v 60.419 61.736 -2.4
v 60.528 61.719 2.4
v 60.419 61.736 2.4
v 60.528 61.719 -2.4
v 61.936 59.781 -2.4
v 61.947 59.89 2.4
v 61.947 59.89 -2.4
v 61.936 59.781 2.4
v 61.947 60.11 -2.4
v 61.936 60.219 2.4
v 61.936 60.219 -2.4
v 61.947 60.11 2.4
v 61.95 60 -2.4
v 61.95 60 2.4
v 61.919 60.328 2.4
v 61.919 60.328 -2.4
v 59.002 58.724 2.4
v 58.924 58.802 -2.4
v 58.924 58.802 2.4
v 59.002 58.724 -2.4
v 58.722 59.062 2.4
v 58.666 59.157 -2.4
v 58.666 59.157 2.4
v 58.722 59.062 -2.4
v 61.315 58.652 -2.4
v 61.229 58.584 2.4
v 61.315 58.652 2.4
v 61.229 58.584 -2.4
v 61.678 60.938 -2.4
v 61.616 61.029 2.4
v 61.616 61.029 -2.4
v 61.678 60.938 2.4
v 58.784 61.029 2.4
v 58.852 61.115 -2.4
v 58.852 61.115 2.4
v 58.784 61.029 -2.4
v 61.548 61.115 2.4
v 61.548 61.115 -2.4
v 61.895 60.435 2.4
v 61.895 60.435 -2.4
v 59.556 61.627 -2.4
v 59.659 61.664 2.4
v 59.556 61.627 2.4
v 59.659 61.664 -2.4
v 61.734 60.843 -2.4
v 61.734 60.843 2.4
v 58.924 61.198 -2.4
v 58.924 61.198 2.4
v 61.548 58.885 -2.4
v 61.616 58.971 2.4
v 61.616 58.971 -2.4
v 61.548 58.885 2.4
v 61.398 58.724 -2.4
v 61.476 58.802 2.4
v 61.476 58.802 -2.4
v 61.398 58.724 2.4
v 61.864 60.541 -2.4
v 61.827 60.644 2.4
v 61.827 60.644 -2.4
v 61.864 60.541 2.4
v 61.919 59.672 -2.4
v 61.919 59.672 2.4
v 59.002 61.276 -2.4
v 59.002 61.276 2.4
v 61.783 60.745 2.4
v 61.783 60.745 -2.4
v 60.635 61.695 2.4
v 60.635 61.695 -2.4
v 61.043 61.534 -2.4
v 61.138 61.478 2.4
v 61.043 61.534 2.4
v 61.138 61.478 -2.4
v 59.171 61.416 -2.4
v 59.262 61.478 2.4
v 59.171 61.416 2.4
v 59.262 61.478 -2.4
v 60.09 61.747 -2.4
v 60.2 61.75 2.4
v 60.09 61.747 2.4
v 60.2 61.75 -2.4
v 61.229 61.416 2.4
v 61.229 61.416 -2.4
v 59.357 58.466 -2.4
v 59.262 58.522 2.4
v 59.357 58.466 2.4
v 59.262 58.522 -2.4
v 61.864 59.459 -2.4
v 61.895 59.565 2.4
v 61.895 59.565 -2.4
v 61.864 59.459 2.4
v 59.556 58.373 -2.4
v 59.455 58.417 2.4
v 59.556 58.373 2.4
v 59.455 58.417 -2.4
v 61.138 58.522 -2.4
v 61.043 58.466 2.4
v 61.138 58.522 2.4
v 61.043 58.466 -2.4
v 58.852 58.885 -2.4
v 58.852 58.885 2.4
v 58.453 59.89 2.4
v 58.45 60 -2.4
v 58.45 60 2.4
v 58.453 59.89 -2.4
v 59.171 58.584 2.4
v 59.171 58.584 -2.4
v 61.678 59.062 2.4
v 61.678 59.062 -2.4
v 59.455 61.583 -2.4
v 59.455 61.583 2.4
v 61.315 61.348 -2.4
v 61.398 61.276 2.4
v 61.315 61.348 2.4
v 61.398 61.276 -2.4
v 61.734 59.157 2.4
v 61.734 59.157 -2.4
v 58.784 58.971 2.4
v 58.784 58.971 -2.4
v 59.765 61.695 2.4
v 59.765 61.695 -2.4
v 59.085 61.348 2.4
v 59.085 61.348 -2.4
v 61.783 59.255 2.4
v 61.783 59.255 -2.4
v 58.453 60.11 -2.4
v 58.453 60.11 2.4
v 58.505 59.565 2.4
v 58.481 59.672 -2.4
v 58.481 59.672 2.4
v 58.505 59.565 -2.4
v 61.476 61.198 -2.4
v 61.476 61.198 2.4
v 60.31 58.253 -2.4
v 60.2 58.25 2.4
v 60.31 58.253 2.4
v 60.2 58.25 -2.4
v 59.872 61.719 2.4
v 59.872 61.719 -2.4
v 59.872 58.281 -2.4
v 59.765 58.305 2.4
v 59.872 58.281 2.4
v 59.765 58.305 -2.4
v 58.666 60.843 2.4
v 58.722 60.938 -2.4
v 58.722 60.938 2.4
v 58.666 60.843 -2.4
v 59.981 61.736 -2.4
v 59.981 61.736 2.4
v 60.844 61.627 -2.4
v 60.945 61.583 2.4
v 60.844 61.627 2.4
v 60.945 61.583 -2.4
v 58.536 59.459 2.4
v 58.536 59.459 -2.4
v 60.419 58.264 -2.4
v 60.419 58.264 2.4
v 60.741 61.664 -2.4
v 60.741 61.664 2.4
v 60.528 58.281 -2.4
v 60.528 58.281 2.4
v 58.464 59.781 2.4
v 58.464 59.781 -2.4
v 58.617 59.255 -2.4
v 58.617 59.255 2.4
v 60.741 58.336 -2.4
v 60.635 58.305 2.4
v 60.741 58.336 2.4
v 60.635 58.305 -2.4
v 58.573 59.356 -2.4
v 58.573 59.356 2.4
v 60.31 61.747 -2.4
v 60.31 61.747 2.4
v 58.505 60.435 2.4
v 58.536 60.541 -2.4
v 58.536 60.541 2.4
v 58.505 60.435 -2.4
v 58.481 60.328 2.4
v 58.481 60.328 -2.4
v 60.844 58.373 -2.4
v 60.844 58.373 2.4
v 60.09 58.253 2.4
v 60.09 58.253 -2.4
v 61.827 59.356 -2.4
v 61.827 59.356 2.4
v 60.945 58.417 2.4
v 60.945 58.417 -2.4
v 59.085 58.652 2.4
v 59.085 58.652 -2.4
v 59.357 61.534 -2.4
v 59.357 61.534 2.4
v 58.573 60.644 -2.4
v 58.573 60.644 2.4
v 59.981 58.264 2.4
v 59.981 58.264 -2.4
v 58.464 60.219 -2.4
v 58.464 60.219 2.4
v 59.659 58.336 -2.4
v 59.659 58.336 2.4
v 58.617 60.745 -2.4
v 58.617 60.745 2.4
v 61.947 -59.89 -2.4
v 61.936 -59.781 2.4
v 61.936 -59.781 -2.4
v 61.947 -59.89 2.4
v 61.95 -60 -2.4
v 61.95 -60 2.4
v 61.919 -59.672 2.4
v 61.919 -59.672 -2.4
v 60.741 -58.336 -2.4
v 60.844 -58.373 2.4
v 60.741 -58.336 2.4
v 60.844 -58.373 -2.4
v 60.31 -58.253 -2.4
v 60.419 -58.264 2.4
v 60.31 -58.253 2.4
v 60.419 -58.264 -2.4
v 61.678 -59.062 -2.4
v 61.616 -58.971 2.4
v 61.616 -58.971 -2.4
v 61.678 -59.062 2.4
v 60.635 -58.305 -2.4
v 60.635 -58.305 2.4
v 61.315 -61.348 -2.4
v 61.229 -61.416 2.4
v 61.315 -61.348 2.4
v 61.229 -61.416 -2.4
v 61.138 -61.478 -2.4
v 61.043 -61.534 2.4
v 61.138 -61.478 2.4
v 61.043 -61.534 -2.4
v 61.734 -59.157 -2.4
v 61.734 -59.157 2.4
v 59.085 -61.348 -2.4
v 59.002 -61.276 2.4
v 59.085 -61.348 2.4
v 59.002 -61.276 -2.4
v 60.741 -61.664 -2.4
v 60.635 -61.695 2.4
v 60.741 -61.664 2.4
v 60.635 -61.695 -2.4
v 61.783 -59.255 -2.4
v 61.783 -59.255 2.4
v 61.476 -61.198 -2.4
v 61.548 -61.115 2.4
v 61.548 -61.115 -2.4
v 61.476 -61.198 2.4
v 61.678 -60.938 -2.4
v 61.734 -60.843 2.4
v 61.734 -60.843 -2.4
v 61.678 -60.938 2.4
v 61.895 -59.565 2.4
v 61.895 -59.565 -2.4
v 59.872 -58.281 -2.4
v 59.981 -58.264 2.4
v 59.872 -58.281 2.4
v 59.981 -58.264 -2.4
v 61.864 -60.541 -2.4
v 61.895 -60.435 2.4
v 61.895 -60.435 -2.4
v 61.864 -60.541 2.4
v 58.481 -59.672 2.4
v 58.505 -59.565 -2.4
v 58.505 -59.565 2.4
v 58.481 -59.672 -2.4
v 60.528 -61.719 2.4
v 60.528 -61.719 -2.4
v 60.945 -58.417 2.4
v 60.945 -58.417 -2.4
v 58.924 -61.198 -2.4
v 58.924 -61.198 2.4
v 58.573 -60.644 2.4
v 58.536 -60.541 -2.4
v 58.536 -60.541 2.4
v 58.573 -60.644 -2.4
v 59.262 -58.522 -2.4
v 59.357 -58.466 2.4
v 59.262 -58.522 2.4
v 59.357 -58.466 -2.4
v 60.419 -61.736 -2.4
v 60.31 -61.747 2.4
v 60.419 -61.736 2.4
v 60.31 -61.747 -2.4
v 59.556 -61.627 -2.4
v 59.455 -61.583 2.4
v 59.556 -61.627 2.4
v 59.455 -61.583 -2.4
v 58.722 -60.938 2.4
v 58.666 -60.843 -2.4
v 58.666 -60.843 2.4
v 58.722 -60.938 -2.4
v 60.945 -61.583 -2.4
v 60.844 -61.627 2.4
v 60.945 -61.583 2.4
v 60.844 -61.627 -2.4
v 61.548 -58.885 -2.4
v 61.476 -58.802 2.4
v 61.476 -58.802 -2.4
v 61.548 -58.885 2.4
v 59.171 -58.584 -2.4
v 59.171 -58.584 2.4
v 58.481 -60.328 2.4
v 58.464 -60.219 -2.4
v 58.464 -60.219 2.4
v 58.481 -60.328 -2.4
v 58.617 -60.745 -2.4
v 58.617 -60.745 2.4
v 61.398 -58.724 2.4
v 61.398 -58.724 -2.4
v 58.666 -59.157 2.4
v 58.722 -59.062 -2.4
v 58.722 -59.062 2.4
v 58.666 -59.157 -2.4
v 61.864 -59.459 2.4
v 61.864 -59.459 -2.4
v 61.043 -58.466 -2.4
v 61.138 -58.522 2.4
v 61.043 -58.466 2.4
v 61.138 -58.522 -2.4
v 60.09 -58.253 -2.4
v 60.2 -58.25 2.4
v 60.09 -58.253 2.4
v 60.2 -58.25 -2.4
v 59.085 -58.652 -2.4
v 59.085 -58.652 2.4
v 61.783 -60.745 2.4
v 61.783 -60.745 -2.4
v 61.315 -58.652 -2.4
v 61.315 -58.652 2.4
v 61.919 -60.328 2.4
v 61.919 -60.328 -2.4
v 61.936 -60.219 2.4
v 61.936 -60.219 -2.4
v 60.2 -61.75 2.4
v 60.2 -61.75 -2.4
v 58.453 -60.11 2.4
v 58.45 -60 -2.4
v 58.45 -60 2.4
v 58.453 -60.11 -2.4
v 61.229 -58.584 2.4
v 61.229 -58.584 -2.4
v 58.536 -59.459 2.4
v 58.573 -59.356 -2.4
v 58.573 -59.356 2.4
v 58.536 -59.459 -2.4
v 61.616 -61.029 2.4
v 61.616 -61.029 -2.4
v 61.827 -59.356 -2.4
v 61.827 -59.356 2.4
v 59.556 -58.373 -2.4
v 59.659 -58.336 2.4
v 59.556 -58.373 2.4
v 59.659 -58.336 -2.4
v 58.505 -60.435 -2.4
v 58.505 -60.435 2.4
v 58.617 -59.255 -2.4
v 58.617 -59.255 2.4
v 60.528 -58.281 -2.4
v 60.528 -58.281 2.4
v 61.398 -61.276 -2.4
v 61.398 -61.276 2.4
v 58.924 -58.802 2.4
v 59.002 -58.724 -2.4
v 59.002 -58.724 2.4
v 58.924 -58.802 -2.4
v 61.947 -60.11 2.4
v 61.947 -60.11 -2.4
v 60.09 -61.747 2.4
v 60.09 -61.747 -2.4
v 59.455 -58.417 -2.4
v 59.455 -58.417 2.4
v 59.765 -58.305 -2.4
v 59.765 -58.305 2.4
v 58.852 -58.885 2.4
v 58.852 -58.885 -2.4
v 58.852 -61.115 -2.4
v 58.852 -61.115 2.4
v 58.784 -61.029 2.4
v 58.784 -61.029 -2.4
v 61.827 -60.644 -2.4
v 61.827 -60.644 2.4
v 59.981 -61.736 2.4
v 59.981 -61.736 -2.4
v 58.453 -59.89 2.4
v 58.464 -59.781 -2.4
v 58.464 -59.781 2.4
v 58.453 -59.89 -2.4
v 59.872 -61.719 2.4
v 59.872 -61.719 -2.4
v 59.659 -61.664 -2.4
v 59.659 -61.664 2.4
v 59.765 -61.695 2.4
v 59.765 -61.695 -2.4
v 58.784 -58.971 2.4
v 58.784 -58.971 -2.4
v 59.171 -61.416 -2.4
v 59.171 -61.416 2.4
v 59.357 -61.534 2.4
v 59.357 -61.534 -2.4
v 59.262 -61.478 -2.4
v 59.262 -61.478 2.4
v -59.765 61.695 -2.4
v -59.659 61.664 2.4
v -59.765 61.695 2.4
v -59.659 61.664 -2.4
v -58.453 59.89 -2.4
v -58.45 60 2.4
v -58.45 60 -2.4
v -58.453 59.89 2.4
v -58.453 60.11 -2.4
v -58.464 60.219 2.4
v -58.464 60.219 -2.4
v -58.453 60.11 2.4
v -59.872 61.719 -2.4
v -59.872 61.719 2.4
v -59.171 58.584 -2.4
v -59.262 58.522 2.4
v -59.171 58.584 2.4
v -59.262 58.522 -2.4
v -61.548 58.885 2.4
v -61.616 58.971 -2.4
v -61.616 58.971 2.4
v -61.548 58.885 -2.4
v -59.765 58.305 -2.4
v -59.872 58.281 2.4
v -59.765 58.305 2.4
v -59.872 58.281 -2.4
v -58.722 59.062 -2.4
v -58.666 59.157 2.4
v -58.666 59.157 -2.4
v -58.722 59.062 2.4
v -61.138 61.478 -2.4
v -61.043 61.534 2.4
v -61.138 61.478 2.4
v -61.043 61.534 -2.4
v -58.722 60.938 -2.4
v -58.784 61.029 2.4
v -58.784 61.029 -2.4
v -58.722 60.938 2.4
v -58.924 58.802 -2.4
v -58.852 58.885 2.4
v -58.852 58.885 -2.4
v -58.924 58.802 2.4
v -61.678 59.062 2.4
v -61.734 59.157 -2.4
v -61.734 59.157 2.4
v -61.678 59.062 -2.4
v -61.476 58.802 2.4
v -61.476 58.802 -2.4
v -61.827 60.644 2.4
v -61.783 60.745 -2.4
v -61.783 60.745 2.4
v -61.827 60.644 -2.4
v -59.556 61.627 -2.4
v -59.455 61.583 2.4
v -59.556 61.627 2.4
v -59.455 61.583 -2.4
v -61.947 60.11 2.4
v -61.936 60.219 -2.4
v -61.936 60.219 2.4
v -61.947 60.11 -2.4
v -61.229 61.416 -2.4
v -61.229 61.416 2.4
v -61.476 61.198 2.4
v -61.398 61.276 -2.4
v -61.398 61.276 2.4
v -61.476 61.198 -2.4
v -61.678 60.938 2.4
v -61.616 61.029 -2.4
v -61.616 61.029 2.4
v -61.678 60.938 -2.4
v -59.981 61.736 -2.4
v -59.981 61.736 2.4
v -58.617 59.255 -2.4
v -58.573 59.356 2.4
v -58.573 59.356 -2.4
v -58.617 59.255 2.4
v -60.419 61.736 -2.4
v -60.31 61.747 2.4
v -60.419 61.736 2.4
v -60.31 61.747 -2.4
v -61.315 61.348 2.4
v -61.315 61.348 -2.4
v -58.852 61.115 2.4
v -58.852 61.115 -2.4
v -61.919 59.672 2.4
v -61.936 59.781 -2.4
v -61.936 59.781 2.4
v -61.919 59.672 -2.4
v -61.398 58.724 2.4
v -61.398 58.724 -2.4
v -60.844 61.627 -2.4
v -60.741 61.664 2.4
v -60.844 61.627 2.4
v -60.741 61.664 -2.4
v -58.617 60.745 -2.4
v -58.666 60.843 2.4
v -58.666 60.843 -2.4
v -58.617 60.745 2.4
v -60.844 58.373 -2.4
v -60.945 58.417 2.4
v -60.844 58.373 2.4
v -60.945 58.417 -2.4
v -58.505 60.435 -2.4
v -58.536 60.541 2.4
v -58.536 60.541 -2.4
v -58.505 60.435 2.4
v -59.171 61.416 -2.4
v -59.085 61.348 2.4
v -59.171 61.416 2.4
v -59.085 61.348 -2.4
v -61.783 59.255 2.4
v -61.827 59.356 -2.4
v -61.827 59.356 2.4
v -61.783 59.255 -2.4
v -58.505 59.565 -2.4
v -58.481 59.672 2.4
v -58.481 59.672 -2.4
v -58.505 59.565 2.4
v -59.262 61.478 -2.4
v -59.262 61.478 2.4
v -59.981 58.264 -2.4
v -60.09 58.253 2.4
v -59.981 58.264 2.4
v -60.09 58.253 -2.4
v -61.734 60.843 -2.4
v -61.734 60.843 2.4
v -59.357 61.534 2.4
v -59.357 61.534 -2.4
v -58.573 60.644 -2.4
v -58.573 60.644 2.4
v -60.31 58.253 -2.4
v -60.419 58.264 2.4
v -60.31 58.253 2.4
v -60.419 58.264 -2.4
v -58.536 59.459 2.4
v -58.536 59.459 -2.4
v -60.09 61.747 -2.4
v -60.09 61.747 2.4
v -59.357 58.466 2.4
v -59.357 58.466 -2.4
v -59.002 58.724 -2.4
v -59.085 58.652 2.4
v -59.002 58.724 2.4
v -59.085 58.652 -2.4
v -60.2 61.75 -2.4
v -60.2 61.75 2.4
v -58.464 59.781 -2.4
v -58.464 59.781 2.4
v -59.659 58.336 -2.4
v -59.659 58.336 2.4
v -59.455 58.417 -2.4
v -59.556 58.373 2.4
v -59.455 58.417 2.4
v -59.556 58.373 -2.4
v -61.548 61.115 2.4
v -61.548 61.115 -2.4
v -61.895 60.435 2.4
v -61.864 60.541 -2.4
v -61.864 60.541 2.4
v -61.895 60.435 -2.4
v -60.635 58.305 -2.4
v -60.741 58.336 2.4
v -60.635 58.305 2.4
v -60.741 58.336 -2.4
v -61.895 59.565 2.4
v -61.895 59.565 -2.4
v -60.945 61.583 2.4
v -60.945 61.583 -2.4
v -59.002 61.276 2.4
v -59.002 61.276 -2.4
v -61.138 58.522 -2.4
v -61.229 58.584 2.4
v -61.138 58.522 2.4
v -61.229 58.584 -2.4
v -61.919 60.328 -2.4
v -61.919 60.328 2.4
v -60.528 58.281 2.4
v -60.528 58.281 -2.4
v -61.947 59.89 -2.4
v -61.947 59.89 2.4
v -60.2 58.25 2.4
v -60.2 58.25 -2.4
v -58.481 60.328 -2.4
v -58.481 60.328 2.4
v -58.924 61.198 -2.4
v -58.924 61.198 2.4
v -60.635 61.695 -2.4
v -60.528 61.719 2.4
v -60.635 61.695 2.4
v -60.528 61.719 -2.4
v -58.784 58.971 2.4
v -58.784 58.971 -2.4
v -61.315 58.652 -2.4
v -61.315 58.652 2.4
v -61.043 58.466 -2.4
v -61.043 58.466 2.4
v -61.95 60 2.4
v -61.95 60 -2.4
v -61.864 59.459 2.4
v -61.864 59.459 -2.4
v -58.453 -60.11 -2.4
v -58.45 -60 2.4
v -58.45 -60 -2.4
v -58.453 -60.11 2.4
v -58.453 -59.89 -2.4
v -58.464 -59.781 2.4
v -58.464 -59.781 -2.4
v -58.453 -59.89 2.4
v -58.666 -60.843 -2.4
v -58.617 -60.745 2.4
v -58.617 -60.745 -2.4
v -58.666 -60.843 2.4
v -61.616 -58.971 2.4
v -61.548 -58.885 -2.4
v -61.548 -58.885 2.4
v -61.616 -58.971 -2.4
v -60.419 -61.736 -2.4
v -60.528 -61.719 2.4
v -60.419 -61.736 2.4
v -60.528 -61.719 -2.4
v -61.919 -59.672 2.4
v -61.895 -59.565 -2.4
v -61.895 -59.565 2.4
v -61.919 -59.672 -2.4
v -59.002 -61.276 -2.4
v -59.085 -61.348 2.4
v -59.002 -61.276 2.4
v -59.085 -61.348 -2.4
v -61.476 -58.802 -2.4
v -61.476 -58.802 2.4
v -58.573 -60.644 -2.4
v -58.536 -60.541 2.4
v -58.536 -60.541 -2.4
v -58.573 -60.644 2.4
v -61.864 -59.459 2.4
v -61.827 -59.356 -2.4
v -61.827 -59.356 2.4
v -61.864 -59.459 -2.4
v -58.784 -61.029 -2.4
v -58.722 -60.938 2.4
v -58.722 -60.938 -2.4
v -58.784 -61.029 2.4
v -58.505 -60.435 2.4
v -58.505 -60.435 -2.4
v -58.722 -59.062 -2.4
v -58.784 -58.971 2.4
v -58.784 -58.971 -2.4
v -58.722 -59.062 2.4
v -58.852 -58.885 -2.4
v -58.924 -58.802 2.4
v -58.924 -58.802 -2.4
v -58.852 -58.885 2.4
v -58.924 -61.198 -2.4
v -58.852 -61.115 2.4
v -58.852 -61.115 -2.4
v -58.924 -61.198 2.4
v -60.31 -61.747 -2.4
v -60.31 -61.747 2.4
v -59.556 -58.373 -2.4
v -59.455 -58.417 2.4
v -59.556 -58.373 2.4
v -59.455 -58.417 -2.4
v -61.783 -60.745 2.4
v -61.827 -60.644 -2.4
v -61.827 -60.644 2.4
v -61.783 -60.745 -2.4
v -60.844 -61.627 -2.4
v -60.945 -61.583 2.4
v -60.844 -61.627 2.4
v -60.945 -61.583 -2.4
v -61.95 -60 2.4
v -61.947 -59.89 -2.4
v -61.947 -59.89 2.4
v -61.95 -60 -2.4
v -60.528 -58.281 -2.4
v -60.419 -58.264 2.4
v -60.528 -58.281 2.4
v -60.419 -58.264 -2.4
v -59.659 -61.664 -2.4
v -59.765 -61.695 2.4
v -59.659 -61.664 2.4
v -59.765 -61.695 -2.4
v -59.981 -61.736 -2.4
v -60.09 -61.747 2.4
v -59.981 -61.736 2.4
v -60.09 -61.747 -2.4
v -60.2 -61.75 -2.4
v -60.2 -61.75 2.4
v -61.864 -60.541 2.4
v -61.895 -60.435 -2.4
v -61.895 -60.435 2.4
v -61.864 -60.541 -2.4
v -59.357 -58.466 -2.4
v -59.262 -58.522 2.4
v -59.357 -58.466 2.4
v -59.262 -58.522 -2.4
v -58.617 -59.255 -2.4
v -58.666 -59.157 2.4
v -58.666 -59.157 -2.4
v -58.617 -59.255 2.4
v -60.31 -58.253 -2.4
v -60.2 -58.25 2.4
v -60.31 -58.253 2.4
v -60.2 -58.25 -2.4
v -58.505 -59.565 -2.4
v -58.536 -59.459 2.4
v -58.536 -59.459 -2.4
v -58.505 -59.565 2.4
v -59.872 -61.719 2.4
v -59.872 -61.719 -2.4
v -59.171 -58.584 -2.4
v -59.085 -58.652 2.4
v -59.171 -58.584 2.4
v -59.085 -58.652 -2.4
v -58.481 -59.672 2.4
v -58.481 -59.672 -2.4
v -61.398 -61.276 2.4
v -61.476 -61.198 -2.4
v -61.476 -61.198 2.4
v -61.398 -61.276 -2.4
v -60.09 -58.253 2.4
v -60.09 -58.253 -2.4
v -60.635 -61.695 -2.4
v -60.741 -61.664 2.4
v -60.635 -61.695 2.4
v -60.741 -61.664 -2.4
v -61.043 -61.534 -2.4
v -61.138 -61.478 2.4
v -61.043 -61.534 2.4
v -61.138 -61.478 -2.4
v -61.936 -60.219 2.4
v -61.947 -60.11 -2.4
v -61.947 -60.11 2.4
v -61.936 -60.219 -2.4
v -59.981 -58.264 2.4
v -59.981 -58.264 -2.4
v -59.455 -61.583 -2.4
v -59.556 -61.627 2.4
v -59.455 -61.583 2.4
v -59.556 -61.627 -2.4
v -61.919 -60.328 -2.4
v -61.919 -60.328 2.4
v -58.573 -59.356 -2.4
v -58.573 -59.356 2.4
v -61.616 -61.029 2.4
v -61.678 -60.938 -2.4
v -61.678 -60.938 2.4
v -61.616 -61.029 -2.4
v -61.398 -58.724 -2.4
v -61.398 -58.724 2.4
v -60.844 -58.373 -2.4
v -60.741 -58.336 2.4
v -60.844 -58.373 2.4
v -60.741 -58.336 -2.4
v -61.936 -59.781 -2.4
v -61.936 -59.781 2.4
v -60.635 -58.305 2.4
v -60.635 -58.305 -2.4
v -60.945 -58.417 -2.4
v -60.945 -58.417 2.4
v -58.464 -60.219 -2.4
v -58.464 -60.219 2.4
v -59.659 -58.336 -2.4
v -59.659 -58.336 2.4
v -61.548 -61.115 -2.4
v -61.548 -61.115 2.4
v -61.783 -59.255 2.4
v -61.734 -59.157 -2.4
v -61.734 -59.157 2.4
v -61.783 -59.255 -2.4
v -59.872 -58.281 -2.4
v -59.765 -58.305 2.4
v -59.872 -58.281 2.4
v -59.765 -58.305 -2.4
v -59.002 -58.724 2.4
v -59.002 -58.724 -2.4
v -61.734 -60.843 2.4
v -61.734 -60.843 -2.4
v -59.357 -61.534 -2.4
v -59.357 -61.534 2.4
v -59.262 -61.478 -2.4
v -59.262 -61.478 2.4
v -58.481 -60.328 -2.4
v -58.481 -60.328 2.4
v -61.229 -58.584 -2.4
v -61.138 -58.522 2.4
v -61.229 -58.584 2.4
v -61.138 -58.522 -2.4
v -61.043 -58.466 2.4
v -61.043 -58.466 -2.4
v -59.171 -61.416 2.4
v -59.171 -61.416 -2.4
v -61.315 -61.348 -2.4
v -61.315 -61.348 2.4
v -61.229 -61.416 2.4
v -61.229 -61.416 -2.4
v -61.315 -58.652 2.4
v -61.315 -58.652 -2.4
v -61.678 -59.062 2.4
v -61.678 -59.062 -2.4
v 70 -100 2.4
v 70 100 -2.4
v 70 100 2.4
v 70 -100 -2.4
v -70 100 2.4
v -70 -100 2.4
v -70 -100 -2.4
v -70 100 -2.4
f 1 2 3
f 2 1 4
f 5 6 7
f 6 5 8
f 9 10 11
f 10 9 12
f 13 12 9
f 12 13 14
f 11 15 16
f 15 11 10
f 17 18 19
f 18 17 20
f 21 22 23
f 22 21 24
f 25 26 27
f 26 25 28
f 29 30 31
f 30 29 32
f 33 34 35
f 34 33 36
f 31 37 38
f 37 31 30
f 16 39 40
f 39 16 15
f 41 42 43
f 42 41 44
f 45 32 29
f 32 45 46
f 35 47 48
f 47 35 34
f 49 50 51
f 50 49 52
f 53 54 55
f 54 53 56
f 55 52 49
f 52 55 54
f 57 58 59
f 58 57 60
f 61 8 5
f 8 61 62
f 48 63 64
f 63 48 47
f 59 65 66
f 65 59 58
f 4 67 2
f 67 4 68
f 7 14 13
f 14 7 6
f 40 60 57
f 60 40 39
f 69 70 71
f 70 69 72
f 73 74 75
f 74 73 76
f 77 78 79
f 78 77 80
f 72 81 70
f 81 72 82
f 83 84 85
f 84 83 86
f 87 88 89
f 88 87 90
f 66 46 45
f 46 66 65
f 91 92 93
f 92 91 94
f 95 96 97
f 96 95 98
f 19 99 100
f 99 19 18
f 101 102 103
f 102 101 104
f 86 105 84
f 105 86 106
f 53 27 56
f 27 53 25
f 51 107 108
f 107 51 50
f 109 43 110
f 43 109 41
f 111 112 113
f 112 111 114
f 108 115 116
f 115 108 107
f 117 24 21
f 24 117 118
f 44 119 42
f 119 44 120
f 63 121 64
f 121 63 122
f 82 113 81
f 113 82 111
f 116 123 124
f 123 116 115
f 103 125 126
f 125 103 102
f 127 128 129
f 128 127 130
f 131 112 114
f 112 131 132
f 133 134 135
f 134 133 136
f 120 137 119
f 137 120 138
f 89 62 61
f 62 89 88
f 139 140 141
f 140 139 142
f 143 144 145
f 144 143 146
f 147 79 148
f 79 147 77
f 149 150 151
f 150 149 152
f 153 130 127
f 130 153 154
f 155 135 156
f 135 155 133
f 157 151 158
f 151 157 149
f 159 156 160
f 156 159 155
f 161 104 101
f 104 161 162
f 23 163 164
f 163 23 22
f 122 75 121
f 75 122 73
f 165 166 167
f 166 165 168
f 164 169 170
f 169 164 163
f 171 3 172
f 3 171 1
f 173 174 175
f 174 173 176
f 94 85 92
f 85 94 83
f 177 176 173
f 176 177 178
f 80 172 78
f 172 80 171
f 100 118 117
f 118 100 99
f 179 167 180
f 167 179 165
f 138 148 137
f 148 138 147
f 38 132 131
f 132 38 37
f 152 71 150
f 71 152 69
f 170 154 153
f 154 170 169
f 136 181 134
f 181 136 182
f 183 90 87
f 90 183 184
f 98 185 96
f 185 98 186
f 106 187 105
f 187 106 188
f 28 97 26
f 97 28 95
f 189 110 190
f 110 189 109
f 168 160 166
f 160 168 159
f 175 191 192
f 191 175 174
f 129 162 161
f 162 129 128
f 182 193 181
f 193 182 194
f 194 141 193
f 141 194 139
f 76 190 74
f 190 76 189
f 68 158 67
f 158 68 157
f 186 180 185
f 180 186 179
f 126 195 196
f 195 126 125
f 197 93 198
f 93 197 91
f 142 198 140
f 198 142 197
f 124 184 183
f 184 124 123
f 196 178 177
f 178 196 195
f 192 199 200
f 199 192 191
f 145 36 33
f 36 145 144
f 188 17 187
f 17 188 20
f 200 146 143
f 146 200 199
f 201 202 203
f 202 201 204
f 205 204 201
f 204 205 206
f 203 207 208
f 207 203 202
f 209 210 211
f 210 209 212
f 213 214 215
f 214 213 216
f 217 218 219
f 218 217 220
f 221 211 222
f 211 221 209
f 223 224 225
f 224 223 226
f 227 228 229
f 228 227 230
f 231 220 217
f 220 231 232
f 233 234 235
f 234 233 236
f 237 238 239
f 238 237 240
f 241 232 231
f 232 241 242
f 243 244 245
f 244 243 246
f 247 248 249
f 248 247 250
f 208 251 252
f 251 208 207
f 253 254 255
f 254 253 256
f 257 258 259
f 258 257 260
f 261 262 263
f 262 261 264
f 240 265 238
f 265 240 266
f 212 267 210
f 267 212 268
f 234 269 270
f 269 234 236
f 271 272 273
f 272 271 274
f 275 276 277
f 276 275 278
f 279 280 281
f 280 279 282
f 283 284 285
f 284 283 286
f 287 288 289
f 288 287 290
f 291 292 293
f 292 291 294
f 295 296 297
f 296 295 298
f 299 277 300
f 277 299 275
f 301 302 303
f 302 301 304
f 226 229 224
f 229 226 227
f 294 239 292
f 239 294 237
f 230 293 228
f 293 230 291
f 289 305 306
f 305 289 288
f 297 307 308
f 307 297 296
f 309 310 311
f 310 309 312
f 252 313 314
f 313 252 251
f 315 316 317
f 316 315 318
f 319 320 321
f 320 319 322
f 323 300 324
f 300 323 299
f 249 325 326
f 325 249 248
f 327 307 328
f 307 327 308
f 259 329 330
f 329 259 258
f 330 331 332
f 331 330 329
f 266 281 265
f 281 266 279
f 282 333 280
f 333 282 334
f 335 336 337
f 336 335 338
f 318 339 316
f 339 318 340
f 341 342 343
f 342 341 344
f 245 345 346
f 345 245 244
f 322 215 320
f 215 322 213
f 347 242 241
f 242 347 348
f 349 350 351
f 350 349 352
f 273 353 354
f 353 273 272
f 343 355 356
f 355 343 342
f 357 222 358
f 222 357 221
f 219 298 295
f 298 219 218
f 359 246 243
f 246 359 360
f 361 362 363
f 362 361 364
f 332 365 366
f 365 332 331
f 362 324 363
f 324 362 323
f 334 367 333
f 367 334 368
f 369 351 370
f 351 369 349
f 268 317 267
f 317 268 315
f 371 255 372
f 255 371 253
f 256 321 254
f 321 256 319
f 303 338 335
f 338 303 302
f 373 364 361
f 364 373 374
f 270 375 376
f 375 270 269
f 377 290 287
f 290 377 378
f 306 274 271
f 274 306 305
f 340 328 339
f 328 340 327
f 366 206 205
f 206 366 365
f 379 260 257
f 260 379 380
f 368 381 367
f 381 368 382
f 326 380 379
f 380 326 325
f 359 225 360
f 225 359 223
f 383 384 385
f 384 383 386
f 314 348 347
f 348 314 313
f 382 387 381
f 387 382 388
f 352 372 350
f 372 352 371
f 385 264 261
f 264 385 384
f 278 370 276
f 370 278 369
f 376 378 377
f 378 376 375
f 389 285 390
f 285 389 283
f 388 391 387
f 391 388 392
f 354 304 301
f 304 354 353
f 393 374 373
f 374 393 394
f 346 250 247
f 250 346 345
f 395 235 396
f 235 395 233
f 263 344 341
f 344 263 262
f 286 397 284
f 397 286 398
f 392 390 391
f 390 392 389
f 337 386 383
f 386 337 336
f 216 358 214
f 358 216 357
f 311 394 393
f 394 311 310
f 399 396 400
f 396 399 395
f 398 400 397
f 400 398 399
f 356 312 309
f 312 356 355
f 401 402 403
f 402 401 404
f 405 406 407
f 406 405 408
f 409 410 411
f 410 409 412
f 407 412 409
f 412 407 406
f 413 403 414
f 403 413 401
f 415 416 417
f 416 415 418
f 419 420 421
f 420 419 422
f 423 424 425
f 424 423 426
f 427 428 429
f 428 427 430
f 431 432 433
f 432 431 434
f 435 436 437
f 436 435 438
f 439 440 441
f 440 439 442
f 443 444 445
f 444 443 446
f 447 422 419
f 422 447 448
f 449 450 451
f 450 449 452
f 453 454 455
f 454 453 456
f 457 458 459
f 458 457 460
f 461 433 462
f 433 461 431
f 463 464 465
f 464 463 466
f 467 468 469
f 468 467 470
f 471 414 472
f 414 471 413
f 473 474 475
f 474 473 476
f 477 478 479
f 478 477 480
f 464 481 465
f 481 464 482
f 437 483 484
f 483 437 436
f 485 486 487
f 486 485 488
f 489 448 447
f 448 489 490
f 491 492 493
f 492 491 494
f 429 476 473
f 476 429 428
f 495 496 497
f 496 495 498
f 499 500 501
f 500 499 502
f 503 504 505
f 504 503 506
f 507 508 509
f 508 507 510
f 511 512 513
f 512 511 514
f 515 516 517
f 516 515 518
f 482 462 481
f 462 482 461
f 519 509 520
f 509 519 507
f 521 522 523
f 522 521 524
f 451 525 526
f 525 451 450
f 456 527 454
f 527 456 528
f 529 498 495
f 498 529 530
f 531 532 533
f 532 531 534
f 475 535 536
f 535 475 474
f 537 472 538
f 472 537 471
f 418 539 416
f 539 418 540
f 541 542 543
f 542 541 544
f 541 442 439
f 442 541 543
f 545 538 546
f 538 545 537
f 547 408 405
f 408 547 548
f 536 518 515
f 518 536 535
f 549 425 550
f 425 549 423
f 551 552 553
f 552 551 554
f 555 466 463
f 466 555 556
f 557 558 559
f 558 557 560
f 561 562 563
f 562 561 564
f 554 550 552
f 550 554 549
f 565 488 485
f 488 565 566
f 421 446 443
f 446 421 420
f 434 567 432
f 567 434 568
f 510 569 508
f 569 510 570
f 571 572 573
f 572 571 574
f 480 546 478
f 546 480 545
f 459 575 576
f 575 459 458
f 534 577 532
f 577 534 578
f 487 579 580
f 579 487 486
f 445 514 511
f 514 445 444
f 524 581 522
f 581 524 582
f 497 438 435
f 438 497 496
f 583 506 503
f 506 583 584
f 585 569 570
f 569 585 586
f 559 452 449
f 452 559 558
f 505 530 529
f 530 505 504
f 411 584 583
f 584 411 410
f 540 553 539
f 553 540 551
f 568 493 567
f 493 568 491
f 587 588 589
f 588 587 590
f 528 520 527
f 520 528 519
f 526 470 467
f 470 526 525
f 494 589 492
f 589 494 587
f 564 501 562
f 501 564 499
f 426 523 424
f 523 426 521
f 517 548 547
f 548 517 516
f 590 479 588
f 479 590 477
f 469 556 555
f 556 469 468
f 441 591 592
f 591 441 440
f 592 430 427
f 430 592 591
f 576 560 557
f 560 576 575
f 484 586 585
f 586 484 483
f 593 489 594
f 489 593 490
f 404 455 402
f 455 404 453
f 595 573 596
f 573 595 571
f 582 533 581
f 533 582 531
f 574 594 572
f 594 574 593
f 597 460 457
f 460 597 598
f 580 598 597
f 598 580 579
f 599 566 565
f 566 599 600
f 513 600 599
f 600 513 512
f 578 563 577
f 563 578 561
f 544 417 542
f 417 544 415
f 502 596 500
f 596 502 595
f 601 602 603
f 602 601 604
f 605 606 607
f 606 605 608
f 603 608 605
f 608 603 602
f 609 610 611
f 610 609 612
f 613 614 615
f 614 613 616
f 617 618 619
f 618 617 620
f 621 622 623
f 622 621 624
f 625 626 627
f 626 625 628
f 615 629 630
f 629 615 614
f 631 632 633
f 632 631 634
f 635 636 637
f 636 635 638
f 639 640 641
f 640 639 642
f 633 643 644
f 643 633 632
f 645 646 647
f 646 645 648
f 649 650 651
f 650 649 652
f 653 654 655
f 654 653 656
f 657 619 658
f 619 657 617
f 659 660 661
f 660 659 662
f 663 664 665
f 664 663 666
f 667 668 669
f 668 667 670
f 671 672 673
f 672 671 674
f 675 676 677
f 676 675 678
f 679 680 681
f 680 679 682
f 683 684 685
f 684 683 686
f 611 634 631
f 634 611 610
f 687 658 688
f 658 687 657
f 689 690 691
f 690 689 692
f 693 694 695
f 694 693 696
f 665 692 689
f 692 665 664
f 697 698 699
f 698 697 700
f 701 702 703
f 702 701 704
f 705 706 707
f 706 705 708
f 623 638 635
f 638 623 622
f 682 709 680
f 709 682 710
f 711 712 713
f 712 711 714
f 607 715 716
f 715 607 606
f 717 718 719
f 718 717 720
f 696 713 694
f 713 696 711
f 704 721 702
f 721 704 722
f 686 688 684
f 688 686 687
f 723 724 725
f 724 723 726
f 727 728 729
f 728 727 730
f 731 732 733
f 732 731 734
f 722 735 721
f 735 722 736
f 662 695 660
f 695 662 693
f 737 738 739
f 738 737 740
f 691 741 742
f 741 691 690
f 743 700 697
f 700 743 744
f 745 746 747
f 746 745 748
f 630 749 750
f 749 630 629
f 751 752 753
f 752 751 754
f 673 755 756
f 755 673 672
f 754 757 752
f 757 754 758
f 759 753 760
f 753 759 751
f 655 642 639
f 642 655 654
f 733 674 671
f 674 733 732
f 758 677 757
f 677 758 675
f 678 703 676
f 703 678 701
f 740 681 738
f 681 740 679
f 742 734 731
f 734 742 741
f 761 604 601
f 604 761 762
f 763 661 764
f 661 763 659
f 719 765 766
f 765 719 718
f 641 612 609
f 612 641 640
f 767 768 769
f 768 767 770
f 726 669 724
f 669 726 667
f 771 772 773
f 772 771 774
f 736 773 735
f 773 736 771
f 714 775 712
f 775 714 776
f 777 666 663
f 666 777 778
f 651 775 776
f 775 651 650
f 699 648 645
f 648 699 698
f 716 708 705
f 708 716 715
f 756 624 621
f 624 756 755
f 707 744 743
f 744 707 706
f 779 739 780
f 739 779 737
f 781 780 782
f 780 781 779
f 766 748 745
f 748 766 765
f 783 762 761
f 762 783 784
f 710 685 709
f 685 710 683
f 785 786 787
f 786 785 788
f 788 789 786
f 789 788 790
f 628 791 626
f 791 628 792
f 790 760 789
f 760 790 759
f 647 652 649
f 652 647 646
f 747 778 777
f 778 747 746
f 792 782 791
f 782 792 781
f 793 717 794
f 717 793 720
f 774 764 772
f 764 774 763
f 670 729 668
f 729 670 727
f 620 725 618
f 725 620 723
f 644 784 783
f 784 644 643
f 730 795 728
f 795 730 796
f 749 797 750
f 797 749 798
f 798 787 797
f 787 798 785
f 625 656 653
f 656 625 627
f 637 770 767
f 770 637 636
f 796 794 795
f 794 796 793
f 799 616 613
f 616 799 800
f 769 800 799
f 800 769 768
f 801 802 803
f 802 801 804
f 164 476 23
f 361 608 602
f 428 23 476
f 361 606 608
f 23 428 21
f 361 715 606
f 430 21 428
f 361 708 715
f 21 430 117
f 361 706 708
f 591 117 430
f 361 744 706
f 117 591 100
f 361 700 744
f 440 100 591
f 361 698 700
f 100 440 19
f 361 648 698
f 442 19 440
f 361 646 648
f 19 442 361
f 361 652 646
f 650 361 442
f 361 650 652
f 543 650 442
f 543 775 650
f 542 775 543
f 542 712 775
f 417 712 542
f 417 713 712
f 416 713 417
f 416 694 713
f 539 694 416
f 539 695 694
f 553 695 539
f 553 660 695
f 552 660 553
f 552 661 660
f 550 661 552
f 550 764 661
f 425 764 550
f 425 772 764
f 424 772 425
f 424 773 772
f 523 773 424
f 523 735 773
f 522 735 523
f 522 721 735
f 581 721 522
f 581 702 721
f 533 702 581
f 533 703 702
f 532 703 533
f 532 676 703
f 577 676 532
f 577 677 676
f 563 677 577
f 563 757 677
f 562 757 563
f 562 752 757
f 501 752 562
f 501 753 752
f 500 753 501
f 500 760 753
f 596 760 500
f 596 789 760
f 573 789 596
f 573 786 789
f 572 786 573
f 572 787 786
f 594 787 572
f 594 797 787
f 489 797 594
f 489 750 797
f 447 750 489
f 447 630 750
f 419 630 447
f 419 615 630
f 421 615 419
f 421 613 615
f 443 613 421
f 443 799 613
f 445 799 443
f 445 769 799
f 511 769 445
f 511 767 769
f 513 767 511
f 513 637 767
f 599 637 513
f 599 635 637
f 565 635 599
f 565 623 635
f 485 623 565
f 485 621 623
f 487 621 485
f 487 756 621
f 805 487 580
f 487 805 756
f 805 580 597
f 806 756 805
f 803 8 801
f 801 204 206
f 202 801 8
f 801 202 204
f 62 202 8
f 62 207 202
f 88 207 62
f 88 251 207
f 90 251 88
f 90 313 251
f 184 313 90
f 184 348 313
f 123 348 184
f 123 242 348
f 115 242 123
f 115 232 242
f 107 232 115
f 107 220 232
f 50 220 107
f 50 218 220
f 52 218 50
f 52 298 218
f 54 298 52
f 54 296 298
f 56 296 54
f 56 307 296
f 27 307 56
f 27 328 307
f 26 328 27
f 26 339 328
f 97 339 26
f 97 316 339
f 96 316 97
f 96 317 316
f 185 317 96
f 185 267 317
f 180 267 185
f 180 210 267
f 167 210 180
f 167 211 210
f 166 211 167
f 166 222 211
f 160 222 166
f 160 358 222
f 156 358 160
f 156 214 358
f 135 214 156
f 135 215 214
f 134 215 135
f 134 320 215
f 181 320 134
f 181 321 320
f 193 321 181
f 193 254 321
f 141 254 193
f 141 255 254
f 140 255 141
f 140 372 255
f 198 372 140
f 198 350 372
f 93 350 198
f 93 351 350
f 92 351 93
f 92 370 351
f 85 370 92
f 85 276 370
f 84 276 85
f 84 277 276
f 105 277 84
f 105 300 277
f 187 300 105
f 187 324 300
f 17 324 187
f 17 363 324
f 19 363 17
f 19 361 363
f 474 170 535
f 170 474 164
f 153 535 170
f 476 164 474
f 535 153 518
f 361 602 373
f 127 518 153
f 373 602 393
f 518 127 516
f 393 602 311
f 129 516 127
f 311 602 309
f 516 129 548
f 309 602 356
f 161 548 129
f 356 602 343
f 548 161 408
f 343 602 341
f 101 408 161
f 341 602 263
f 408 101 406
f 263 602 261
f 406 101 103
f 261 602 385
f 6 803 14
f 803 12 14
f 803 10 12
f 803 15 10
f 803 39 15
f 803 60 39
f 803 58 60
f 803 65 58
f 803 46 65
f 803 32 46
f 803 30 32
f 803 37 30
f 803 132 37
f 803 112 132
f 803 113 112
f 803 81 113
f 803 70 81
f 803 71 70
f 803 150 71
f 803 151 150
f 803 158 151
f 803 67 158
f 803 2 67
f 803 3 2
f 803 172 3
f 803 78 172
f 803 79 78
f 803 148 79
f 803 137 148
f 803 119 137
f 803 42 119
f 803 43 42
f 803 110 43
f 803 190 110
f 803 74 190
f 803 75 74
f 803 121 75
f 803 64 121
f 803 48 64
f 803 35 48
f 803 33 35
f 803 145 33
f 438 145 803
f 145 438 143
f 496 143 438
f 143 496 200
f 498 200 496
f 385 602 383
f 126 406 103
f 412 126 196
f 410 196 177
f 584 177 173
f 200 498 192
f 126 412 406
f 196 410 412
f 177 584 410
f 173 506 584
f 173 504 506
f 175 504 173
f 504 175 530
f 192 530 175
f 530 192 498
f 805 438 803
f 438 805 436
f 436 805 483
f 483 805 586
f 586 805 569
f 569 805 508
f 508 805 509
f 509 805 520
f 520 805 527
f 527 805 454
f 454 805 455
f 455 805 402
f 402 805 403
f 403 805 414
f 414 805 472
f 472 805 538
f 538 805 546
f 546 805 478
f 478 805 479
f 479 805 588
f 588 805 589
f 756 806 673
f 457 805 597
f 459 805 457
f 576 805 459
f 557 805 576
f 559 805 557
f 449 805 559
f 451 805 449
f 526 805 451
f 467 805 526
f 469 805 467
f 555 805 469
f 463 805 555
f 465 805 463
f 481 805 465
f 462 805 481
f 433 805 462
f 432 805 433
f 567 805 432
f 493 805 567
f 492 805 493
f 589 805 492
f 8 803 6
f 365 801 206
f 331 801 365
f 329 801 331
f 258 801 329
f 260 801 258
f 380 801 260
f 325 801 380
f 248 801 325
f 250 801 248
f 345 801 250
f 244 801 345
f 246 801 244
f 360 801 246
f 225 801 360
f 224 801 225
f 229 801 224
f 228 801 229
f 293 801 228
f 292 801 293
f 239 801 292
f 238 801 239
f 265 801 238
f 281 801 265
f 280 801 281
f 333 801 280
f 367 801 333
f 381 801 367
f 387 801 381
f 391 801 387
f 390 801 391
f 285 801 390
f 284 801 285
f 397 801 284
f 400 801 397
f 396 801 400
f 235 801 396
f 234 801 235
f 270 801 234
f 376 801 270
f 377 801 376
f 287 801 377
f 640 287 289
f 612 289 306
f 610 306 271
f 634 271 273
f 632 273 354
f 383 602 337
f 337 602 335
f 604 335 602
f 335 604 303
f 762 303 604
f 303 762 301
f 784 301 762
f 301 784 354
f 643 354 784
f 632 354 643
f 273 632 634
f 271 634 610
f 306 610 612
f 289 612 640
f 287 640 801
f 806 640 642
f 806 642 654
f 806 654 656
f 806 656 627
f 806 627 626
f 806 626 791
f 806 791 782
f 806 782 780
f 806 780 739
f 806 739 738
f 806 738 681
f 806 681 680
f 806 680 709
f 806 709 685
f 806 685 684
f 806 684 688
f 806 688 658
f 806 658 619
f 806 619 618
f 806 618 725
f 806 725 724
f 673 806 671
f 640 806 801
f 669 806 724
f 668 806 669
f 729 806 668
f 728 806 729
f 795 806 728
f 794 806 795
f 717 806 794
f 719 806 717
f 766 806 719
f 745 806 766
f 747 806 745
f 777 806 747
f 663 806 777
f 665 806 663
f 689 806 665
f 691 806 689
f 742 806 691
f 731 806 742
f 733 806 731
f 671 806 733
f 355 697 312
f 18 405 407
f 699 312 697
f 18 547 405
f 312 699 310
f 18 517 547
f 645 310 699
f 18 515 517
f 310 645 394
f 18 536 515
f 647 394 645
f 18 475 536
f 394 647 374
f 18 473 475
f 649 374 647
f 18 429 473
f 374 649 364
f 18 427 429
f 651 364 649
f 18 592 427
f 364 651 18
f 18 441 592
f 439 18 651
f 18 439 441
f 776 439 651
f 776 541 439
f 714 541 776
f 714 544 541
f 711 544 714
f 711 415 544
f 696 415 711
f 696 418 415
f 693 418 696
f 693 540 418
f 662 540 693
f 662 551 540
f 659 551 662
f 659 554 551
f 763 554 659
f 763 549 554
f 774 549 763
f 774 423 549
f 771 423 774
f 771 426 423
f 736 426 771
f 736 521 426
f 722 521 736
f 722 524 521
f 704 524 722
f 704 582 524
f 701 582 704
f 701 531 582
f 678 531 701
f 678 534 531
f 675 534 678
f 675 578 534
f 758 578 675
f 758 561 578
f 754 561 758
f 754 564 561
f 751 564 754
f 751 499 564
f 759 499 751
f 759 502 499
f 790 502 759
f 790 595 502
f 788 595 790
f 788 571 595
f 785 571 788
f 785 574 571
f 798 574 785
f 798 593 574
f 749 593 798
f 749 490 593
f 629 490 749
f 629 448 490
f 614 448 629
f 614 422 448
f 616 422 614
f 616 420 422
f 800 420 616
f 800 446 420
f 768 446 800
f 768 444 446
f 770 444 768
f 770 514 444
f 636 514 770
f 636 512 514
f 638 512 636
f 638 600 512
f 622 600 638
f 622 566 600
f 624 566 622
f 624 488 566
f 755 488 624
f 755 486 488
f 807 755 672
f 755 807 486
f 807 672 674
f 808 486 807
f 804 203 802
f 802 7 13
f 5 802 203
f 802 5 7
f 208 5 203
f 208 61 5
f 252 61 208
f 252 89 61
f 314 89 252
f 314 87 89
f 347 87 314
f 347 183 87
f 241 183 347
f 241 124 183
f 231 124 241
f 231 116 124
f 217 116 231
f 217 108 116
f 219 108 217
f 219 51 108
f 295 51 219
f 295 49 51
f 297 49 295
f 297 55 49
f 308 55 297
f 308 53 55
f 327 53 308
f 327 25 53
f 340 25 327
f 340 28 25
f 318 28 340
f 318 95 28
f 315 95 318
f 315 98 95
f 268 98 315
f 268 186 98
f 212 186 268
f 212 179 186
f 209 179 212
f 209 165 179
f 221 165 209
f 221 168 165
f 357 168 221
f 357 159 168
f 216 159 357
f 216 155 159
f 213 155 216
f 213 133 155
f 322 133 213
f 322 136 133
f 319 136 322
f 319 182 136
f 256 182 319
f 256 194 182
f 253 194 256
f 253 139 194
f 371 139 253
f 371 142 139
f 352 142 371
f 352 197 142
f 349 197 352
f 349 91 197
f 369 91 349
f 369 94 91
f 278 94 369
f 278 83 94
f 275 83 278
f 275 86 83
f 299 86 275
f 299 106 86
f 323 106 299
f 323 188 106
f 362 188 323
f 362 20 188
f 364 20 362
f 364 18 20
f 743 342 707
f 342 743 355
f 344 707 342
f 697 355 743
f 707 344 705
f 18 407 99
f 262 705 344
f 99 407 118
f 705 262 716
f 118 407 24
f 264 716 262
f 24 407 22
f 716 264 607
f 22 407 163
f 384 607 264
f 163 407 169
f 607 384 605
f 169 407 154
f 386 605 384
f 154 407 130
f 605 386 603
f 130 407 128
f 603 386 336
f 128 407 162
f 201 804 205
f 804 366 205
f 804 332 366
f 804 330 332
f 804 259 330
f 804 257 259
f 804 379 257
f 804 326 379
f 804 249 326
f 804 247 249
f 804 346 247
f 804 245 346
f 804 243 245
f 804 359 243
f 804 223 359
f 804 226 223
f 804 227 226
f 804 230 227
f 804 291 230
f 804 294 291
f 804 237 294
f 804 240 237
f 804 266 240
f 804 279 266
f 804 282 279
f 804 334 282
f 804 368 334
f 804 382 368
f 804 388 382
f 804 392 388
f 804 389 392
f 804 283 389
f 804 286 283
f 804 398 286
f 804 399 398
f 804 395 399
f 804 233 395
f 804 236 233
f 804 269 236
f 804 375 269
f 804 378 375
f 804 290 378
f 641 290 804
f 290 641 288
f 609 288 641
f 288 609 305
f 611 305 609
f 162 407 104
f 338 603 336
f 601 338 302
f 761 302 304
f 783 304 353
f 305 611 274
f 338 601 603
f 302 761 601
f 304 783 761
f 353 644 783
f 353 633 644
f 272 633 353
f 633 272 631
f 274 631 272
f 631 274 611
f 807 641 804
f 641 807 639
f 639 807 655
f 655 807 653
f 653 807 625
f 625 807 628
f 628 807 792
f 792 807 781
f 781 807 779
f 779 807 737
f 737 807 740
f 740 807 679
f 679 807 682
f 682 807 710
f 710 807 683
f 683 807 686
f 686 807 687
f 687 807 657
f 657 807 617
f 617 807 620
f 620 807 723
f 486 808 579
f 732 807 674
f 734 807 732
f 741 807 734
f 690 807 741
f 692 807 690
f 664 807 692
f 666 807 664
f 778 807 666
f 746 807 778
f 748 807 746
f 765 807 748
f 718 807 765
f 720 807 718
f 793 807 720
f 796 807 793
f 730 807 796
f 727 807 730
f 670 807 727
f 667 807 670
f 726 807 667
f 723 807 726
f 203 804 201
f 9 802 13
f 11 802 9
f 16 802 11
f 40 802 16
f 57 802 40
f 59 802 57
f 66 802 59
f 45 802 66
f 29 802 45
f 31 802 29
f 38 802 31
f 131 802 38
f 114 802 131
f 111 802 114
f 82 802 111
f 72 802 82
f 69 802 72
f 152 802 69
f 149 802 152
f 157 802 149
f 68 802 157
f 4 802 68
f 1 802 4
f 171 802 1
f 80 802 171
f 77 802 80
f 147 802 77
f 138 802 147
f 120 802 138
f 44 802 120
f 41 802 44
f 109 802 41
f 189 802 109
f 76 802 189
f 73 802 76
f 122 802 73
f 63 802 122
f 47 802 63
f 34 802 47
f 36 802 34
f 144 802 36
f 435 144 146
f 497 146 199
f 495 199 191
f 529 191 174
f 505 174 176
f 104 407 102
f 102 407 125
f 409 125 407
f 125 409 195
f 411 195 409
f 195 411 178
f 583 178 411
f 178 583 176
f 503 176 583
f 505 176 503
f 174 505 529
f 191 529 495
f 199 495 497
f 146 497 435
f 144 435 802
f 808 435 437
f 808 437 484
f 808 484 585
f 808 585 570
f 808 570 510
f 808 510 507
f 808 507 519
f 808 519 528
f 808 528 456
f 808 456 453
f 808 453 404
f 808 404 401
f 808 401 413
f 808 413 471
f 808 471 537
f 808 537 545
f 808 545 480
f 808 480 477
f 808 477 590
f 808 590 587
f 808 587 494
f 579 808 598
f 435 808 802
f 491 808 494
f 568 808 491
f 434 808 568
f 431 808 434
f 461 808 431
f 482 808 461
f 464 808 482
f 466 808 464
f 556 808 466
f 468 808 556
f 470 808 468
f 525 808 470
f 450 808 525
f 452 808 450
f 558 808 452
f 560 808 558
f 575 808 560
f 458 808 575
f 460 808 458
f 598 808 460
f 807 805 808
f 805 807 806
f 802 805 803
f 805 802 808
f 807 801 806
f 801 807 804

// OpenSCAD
// file: ../configuration.scad
symfloppy_box_x_size = 140;
symfloppy_box_y_size = 200;
symfloppy_box_z_size = 30;
symfloppy_box_pane_thickness = 4.8;


button_y_front_offset = 15;
button_x_spaces = 18;
button_x_center_offset = -25;


holder_piece_x_from_z_offset = 5;
holder_piece_y_centered_holder_piece_gap = 120;
// file: ../envelopes/holdersPiecesThrows.scad
include <../configuration.scad>
holdersPiecesThrows();

module holdersPiecesThrows(
    symfloppy_box_x_size = symfloppy_box_x_size,
    holder_piece_x_from_z_offset = holder_piece_x_from_z_offset,
    symfloppy_box_pane_thickness = symfloppy_box_pane_thickness,
    throws_diameter = 3.5,
    _fn = 100
) {


    translate([
        symfloppy_box_x_size / 2 - holder_piece_x_from_z_offset - symfloppy_box_pane_thickness,
        holder_piece_y_centered_holder_piece_gap / 2,
        0
    ])
        cylinder(d=throws_diameter, h=symfloppy_box_pane_thickness * 2, center=true, $fn=_fn);


    translate([
        symfloppy_box_x_size / 2 - holder_piece_x_from_z_offset - symfloppy_box_pane_thickness,
        -holder_piece_y_centered_holder_piece_gap / 2,
        0
    ])
        cylinder(d=throws_diameter, h=symfloppy_box_pane_thickness * 2, center=true, $fn=_fn);

    translate([
        - symfloppy_box_x_size / 2 + holder_piece_x_from_z_offset + symfloppy_box_pane_thickness,
        holder_piece_y_centered_holder_piece_gap / 2,
        0
    ])
        cylinder(d=throws_diameter, h=symfloppy_box_pane_thickness * 2, center=true, $fn=_fn);
    
    translate([
        - symfloppy_box_x_size / 2 + holder_piece_x_from_z_offset + symfloppy_box_pane_thickness,
        -holder_piece_y_centered_holder_piece_gap / 2,
        0
    ])
        cylinder(d=throws_diameter, h=symfloppy_box_pane_thickness * 2, center=true, $fn=_fn);
}
// file: subpieces/centeredPaneSubPiece.scad
module centeredPaneSubPiece(x_size, y_size, z_size) {
    cube(
        [
            x_size,
            y_size,
            z_size,
        ],
        center = true
    );
}
// main file
use <./subpieces/centeredPaneSubPiece.scad>
use <../envelopes/holdersPiecesThrows.scad>

include <../configuration.scad>

bottomPanePiece();

module bottomPanePiece(
    x_size = symfloppy_box_x_size,
    y_size = symfloppy_box_y_size,
    pane_thickness = symfloppy_box_pane_thickness,

    holder_piece_x_from_z_offset = holder_piece_x_from_z_offset,
) {
    echo("bottomPanePiece", x_size=x_size, y_size=y_size);

    difference() {
        centeredPaneSubPiece(x_size, y_size, pane_thickness);

        holdersPiecesThrows(
            symfloppy_box_x_size = x_size,
            holder_piece_x_from_z_offset = holder_piece_x_from_z_offset,
            symfloppy_box_pane_thickness = pane_thickness,
            throws_diameter = 3.5
        );
    }
}
